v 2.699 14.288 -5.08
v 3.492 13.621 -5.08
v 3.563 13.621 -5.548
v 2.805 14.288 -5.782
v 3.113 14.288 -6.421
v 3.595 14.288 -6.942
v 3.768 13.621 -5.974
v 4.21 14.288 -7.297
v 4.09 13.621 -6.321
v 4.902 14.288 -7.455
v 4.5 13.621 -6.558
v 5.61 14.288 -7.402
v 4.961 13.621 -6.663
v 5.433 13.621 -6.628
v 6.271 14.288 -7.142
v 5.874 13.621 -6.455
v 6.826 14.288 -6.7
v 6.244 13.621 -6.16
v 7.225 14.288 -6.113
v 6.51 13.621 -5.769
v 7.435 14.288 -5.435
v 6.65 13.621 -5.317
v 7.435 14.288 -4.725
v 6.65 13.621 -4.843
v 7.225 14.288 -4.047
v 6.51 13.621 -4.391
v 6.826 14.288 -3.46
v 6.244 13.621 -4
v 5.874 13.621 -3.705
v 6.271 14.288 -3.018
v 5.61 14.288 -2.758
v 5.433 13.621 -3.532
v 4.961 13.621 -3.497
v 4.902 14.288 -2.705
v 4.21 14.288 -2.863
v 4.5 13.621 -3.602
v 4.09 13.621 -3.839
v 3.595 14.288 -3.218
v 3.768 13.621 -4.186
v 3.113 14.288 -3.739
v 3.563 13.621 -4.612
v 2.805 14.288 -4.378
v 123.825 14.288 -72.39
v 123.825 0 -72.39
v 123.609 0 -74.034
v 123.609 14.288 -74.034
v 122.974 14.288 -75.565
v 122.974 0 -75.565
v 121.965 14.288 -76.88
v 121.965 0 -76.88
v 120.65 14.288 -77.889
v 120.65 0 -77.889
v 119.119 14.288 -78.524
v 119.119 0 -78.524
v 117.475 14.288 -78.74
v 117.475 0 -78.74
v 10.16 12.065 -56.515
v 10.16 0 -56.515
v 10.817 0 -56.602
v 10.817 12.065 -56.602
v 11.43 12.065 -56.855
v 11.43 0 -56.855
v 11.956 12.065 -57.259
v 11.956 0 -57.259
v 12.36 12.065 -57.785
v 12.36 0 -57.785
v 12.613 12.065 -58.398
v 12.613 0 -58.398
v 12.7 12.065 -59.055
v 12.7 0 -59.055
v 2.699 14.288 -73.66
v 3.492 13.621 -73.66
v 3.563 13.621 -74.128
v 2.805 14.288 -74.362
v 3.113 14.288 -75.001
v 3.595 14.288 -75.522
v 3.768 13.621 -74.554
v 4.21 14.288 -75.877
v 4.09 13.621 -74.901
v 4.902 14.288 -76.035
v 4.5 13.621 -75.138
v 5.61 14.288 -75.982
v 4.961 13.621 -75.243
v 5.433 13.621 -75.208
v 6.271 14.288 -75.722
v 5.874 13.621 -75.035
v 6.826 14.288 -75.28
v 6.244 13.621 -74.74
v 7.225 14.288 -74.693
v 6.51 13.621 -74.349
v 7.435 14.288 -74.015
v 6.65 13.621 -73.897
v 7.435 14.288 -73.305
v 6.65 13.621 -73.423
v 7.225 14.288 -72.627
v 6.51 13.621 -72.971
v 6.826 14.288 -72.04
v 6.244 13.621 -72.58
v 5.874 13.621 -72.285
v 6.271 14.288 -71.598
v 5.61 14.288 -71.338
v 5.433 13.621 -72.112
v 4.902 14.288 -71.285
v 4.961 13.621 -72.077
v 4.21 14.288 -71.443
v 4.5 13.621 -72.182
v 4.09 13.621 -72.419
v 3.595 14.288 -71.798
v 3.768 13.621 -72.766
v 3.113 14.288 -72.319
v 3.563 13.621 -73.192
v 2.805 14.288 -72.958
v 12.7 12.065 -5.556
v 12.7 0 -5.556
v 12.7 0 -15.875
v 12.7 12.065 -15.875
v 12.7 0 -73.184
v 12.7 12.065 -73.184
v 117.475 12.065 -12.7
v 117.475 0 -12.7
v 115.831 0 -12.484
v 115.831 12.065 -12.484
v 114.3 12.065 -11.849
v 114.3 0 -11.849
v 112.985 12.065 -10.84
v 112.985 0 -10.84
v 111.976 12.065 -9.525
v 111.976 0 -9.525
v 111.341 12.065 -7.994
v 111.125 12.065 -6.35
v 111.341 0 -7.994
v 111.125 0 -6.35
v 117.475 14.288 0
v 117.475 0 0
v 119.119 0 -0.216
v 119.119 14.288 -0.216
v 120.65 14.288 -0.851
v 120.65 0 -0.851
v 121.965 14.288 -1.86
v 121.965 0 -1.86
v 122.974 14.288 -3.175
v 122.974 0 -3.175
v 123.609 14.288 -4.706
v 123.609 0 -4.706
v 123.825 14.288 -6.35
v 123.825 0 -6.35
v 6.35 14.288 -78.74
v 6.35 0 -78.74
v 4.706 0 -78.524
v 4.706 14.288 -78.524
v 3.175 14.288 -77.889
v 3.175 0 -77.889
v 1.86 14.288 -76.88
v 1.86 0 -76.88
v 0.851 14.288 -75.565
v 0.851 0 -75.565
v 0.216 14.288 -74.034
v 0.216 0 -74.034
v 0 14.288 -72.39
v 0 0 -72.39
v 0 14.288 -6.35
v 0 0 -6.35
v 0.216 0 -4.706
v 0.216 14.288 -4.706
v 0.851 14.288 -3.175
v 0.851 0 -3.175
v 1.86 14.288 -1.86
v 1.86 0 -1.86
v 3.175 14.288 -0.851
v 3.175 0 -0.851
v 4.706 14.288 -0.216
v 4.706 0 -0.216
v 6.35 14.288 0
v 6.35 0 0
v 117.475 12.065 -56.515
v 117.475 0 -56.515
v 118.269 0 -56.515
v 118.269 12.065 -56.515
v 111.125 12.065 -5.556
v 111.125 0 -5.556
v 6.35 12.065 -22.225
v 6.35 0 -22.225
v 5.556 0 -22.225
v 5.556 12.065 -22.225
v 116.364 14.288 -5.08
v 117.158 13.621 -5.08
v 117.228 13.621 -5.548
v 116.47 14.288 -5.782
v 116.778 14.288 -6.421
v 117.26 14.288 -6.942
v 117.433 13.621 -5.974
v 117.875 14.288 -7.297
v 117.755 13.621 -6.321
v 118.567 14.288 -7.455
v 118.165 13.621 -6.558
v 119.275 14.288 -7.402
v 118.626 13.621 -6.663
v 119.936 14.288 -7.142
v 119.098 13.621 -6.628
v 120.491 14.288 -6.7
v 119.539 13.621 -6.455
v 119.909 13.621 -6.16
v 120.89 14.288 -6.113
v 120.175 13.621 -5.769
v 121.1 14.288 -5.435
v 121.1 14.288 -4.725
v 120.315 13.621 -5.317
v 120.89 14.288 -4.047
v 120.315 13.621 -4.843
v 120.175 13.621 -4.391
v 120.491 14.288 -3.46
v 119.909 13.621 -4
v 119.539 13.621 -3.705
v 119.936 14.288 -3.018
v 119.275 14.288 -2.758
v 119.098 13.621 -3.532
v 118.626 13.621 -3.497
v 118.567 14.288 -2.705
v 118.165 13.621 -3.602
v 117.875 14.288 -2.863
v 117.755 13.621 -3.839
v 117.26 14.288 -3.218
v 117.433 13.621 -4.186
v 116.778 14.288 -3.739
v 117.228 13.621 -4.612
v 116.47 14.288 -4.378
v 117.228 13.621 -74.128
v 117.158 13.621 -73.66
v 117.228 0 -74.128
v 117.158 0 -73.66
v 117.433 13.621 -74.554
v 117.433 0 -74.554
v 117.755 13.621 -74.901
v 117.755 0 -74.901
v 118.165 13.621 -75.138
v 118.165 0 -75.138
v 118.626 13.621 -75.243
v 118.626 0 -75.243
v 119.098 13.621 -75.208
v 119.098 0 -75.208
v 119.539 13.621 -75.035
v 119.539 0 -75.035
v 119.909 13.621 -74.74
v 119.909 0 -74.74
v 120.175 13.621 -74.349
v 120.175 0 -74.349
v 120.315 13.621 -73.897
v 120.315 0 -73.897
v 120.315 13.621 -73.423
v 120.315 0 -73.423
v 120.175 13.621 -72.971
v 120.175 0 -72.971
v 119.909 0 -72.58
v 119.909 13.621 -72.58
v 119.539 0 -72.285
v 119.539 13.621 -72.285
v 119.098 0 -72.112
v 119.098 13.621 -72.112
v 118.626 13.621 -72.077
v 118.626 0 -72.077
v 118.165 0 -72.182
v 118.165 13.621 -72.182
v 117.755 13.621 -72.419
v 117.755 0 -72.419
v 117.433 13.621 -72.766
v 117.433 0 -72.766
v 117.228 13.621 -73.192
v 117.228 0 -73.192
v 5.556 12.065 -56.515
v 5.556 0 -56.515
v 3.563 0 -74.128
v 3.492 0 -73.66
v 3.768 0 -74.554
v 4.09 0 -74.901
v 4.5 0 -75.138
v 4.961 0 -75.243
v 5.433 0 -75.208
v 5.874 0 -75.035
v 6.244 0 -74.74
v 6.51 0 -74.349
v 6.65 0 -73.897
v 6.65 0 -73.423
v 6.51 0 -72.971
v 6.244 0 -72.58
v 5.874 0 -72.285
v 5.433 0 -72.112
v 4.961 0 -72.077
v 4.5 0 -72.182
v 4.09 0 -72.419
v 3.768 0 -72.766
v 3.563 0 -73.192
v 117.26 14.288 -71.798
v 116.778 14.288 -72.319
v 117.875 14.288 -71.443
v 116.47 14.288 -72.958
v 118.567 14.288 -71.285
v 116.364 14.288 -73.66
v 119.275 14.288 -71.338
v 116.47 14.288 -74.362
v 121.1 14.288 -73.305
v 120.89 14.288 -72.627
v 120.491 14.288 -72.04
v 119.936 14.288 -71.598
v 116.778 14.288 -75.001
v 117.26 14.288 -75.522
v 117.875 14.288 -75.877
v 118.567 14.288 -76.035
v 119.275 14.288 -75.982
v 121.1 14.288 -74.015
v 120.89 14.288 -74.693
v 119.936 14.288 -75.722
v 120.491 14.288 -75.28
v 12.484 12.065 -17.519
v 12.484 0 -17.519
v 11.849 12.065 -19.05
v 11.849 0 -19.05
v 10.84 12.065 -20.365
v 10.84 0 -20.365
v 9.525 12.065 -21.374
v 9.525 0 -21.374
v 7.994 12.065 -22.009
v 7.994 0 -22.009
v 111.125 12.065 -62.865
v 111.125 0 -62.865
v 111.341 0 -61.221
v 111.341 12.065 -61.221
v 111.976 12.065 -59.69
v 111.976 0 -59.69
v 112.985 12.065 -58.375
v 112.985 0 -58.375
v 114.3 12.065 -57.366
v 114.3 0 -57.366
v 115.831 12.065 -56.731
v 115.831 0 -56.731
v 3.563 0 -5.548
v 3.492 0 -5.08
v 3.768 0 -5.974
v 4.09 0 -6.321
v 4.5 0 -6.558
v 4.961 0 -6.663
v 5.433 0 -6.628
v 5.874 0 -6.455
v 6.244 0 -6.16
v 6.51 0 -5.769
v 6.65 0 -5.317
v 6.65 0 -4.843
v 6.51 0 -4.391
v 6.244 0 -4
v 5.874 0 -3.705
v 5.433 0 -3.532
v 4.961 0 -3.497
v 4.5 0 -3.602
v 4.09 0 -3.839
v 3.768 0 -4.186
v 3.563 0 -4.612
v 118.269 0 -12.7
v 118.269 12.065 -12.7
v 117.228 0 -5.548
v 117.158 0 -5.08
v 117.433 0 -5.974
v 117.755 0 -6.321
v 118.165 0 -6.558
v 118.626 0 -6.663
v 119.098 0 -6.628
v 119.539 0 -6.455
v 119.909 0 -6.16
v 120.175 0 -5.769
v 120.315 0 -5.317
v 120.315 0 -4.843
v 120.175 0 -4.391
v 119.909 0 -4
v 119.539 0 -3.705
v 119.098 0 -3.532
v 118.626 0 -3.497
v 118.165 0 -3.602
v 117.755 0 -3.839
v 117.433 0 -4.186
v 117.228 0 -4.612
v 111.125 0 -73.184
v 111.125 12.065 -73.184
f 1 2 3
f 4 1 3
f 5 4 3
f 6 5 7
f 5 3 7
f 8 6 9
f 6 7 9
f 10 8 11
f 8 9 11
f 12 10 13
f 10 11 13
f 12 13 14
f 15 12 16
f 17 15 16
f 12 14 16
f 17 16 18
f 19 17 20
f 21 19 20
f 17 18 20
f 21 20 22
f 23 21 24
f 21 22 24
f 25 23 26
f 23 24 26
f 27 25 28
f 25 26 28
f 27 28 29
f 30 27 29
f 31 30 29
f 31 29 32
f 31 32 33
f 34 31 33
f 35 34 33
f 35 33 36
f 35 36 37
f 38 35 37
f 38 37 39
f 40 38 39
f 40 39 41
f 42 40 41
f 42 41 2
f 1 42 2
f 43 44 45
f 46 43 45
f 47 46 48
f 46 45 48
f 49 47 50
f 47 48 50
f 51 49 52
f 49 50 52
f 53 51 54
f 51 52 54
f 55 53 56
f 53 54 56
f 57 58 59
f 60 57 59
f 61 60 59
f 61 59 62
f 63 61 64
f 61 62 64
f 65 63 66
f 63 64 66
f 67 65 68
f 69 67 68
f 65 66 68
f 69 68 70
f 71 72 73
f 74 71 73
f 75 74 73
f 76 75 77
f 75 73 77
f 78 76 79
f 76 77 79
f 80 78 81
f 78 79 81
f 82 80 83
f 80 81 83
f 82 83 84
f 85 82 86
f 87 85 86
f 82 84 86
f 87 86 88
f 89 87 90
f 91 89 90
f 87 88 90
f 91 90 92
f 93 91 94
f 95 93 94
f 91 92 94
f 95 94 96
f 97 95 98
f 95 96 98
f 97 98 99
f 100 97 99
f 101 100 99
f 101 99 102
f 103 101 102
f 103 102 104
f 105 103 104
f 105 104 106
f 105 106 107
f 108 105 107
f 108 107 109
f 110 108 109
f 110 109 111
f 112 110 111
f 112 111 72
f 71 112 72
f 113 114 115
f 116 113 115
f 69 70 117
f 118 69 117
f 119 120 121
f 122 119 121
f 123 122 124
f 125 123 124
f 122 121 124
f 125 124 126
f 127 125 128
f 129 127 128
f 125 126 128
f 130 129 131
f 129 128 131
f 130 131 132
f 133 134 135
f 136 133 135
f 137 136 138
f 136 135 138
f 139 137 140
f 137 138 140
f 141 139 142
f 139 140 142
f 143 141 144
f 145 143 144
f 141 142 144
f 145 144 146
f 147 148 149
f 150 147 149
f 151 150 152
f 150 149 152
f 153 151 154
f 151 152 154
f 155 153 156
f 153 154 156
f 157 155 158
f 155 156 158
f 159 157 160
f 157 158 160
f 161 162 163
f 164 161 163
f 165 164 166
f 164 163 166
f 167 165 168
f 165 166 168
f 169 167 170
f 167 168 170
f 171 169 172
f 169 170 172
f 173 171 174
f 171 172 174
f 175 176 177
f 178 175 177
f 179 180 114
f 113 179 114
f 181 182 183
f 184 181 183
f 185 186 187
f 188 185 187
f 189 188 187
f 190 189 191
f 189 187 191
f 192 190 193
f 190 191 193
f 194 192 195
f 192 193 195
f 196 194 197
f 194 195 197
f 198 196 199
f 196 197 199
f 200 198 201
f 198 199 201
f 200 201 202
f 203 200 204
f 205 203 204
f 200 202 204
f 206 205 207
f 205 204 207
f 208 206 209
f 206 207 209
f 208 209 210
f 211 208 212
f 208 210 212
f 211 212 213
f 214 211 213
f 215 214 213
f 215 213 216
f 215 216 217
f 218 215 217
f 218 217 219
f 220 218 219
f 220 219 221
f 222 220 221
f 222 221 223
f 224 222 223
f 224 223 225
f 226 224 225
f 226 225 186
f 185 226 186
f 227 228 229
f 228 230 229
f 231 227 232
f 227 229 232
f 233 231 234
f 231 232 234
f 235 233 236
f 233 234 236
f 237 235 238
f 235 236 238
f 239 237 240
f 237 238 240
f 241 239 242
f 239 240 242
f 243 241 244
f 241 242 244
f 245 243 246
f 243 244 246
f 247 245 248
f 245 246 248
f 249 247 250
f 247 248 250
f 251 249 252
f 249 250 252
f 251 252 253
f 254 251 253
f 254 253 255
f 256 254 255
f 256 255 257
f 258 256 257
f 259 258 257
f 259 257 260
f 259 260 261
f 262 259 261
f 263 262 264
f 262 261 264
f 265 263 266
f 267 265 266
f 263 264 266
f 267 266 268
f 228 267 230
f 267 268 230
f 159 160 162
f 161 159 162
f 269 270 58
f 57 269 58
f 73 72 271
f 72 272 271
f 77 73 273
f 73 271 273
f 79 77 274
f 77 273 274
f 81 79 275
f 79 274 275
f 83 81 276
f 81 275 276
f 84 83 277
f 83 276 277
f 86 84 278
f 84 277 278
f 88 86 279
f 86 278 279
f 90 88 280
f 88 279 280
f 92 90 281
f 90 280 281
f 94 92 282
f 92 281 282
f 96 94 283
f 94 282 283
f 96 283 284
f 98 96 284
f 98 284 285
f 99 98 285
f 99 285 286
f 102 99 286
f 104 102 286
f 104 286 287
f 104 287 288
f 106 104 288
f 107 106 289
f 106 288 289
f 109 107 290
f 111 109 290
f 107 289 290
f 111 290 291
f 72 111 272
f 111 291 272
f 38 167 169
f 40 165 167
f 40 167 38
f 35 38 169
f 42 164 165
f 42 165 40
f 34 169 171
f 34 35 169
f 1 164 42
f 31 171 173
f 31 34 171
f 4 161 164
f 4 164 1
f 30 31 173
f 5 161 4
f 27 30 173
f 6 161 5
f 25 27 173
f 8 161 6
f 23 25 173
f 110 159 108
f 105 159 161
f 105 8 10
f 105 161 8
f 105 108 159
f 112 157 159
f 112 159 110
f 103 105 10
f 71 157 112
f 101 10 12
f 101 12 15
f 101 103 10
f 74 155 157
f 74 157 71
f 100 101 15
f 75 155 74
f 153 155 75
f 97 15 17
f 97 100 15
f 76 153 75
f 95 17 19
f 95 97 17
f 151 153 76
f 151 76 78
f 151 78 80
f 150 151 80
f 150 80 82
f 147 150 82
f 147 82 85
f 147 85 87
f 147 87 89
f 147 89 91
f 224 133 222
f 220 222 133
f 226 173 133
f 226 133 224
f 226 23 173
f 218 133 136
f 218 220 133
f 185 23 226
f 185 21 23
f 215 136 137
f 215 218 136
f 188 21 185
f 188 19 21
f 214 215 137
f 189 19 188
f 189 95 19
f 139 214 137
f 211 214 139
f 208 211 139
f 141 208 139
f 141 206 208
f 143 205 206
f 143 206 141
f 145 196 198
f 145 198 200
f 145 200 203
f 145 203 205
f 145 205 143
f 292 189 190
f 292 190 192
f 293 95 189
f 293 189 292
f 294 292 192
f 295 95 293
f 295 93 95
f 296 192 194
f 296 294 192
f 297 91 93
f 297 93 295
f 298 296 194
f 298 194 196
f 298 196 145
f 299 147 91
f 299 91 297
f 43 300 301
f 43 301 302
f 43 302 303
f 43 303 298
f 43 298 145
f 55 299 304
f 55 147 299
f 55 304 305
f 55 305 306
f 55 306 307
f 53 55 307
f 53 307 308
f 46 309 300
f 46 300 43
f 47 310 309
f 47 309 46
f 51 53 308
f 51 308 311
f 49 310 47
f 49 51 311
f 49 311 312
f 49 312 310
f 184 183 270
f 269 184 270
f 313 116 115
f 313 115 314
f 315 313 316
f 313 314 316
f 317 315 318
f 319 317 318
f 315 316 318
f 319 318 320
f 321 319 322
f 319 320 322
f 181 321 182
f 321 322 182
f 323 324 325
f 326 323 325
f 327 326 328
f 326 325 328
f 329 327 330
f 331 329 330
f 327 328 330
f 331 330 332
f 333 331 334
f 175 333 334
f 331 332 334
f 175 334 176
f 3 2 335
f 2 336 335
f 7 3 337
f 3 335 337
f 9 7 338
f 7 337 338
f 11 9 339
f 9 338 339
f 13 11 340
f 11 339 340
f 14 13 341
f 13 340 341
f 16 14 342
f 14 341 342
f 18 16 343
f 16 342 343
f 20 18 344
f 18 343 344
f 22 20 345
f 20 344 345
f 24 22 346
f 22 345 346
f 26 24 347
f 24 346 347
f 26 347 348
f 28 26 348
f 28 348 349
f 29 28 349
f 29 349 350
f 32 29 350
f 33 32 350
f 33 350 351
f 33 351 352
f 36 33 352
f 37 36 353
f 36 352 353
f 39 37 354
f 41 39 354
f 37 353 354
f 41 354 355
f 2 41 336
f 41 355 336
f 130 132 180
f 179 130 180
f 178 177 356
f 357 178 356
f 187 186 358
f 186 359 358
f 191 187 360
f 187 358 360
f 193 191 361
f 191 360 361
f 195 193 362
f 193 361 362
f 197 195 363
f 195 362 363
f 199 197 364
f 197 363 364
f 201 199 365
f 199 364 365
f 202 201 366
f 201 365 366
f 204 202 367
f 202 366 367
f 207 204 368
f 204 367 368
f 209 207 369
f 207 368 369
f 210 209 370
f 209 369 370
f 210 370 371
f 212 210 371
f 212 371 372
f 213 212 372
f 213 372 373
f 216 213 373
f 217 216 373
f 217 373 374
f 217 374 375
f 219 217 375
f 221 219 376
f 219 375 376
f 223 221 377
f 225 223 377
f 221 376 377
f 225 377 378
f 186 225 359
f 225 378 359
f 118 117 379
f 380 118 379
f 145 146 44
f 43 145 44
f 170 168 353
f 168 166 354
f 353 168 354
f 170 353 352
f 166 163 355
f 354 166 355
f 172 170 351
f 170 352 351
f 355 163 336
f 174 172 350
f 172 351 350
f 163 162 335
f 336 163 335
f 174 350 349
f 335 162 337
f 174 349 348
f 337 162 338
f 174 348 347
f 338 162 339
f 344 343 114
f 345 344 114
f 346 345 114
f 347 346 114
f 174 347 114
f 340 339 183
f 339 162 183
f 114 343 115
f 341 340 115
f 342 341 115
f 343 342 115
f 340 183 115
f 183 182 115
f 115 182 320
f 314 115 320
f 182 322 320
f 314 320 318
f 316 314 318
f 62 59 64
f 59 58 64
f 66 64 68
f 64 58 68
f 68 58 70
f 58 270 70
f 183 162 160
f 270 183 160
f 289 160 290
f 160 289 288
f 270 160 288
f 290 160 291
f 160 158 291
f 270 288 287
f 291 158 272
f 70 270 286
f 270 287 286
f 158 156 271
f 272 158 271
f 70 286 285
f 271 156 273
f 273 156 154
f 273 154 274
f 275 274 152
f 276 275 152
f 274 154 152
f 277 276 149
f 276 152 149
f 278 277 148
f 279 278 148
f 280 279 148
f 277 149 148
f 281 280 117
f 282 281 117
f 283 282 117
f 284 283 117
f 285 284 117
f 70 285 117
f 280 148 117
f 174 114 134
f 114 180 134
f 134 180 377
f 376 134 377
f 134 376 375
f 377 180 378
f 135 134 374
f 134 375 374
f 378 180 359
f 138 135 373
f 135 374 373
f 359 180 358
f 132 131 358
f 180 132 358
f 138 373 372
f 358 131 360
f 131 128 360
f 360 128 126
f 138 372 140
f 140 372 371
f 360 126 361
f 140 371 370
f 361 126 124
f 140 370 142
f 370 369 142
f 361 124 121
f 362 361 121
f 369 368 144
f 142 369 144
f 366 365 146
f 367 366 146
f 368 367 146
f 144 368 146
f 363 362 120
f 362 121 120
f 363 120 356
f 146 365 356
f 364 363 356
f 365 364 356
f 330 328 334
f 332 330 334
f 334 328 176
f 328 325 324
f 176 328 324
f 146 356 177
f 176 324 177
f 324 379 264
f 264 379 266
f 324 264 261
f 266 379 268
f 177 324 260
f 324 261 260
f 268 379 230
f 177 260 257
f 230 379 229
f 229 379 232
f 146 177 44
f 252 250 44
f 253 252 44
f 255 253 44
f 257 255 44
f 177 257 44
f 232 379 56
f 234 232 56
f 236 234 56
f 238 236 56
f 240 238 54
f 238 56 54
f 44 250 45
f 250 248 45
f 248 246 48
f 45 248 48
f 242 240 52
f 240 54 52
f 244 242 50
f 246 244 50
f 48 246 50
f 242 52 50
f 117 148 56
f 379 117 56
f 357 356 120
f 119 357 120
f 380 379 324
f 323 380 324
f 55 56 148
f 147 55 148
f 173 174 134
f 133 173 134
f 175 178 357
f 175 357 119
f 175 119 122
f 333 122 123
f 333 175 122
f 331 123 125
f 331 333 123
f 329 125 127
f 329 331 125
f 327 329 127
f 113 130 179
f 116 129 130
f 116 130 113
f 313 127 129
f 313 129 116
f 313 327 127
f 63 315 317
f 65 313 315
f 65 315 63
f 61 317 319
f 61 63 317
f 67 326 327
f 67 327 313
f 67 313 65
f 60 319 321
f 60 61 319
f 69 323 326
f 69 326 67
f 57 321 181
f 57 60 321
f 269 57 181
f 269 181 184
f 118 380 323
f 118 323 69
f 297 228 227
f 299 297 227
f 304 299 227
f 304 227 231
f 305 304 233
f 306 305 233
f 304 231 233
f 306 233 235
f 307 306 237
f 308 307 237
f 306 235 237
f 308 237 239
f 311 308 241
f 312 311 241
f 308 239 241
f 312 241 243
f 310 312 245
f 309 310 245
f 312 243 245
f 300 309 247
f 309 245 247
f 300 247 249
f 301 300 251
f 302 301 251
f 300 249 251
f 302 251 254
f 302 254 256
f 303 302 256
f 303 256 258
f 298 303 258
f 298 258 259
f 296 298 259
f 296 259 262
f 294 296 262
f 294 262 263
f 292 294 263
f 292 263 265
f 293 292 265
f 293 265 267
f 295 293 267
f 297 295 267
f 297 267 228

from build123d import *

# Parameters (mm, degrees)
BOSS_EXTRUDE1_DEPTH                    = 14.2875
F_97_0_0059_DIAMETER_HOLE1_D           = 3.175
F_97_0_0059_DIAMETER_HOLE1_CSINK_D     = 4.7625
F_97_0_0059_DIAMETER_HOLE1_CSINK_ANGLE = 100
CUT_EXTRUDE1_DEPTH                     = 12.065


with BuildPart() as part:
    # Sketch1 → Boss-Extrude1 (new body)
    with BuildSketch(Plane(origin=(0, 0, 0), x_dir=(1, 0, 0), z_dir=(0, 1, 0))):
        with BuildLine():
            Line((6.35, 0), (117.475, 0))
            ThreePointArc((117.475, 0), (121.965128061, 1.859871939), (123.825, 6.35))
            Line((123.825, 6.35), (123.825, 72.39))
            ThreePointArc((123.825, 72.39), (121.965128061, 76.880128061), (117.475, 78.74))
            Line((117.475, 78.74), (6.35, 78.74))
            ThreePointArc((6.35, 78.74), (1.859871939, 76.880128061), (0, 72.39))
            Line((0, 72.39), (0, 6.35))
            ThreePointArc((0, 6.35), (1.859871939, 1.859871939), (6.35, 0))
        make_face()
    extrude(amount=BOSS_EXTRUDE1_DEPTH)

    # #97 (0.0059) Diameter Hole1 (through all)
    with Locations(Plane(origin=(0, 14.2875, 0), x_dir=(1, 0, 0), z_dir=(0, 1, 0))):
        with Locations((5.08, 5.08), (5.08, 73.66), (118.745, 73.66), (118.745, 5.08)):
            CounterSinkHole(F_97_0_0059_DIAMETER_HOLE1_D / 2, F_97_0_0059_DIAMETER_HOLE1_CSINK_D / 2, counter_sink_angle=F_97_0_0059_DIAMETER_HOLE1_CSINK_ANGLE)

    # Sketch5 → Cut-Extrude1 (cut)
    with BuildSketch(Plane(origin=(0, 0, 0), x_dir=(-1, 0, 0), z_dir=(0, -1, 0))):
        with BuildLine():
            Line((-111.125, 73.18375), (-111.125, 62.865))
            ThreePointArc((-111.125, 62.865), (-112.984871939, 58.374871939), (-117.475, 56.515))
            Line((-117.475, 56.515), (-118.26875, 56.515))
            Line((-118.26875, 56.515), (-118.26875, 12.7))
            Line((-118.26875, 12.7), (-117.475, 12.7))
            ThreePointArc((-117.475, 12.7), (-112.984871939, 10.840128061), (-111.125, 6.35))
            Line((-111.125, 6.35), (-111.125, 5.55625))
            Line((-111.125, 5.55625), (-12.7, 5.55625))
            Line((-12.7, 5.55625), (-12.7, 15.875))
            ThreePointArc((-12.7, 15.875), (-10.840128061, 20.365128061), (-6.35, 22.225))
            Line((-6.35, 22.225), (-5.55625, 22.225))
            Line((-5.55625, 22.225), (-5.55625, 56.515))
            Line((-5.55625, 56.515), (-10.16, 56.515))
            ThreePointArc((-10.16, 56.515), (-11.956051224, 57.258948776), (-12.7, 59.055))
            Line((-12.7, 59.055), (-12.7, 73.18375))
            Line((-12.7, 73.18375), (-111.125, 73.18375))
        make_face()
    extrude(amount=-CUT_EXTRUDE1_DEPTH, mode=Mode.SUBTRACT)


solid = part.part
